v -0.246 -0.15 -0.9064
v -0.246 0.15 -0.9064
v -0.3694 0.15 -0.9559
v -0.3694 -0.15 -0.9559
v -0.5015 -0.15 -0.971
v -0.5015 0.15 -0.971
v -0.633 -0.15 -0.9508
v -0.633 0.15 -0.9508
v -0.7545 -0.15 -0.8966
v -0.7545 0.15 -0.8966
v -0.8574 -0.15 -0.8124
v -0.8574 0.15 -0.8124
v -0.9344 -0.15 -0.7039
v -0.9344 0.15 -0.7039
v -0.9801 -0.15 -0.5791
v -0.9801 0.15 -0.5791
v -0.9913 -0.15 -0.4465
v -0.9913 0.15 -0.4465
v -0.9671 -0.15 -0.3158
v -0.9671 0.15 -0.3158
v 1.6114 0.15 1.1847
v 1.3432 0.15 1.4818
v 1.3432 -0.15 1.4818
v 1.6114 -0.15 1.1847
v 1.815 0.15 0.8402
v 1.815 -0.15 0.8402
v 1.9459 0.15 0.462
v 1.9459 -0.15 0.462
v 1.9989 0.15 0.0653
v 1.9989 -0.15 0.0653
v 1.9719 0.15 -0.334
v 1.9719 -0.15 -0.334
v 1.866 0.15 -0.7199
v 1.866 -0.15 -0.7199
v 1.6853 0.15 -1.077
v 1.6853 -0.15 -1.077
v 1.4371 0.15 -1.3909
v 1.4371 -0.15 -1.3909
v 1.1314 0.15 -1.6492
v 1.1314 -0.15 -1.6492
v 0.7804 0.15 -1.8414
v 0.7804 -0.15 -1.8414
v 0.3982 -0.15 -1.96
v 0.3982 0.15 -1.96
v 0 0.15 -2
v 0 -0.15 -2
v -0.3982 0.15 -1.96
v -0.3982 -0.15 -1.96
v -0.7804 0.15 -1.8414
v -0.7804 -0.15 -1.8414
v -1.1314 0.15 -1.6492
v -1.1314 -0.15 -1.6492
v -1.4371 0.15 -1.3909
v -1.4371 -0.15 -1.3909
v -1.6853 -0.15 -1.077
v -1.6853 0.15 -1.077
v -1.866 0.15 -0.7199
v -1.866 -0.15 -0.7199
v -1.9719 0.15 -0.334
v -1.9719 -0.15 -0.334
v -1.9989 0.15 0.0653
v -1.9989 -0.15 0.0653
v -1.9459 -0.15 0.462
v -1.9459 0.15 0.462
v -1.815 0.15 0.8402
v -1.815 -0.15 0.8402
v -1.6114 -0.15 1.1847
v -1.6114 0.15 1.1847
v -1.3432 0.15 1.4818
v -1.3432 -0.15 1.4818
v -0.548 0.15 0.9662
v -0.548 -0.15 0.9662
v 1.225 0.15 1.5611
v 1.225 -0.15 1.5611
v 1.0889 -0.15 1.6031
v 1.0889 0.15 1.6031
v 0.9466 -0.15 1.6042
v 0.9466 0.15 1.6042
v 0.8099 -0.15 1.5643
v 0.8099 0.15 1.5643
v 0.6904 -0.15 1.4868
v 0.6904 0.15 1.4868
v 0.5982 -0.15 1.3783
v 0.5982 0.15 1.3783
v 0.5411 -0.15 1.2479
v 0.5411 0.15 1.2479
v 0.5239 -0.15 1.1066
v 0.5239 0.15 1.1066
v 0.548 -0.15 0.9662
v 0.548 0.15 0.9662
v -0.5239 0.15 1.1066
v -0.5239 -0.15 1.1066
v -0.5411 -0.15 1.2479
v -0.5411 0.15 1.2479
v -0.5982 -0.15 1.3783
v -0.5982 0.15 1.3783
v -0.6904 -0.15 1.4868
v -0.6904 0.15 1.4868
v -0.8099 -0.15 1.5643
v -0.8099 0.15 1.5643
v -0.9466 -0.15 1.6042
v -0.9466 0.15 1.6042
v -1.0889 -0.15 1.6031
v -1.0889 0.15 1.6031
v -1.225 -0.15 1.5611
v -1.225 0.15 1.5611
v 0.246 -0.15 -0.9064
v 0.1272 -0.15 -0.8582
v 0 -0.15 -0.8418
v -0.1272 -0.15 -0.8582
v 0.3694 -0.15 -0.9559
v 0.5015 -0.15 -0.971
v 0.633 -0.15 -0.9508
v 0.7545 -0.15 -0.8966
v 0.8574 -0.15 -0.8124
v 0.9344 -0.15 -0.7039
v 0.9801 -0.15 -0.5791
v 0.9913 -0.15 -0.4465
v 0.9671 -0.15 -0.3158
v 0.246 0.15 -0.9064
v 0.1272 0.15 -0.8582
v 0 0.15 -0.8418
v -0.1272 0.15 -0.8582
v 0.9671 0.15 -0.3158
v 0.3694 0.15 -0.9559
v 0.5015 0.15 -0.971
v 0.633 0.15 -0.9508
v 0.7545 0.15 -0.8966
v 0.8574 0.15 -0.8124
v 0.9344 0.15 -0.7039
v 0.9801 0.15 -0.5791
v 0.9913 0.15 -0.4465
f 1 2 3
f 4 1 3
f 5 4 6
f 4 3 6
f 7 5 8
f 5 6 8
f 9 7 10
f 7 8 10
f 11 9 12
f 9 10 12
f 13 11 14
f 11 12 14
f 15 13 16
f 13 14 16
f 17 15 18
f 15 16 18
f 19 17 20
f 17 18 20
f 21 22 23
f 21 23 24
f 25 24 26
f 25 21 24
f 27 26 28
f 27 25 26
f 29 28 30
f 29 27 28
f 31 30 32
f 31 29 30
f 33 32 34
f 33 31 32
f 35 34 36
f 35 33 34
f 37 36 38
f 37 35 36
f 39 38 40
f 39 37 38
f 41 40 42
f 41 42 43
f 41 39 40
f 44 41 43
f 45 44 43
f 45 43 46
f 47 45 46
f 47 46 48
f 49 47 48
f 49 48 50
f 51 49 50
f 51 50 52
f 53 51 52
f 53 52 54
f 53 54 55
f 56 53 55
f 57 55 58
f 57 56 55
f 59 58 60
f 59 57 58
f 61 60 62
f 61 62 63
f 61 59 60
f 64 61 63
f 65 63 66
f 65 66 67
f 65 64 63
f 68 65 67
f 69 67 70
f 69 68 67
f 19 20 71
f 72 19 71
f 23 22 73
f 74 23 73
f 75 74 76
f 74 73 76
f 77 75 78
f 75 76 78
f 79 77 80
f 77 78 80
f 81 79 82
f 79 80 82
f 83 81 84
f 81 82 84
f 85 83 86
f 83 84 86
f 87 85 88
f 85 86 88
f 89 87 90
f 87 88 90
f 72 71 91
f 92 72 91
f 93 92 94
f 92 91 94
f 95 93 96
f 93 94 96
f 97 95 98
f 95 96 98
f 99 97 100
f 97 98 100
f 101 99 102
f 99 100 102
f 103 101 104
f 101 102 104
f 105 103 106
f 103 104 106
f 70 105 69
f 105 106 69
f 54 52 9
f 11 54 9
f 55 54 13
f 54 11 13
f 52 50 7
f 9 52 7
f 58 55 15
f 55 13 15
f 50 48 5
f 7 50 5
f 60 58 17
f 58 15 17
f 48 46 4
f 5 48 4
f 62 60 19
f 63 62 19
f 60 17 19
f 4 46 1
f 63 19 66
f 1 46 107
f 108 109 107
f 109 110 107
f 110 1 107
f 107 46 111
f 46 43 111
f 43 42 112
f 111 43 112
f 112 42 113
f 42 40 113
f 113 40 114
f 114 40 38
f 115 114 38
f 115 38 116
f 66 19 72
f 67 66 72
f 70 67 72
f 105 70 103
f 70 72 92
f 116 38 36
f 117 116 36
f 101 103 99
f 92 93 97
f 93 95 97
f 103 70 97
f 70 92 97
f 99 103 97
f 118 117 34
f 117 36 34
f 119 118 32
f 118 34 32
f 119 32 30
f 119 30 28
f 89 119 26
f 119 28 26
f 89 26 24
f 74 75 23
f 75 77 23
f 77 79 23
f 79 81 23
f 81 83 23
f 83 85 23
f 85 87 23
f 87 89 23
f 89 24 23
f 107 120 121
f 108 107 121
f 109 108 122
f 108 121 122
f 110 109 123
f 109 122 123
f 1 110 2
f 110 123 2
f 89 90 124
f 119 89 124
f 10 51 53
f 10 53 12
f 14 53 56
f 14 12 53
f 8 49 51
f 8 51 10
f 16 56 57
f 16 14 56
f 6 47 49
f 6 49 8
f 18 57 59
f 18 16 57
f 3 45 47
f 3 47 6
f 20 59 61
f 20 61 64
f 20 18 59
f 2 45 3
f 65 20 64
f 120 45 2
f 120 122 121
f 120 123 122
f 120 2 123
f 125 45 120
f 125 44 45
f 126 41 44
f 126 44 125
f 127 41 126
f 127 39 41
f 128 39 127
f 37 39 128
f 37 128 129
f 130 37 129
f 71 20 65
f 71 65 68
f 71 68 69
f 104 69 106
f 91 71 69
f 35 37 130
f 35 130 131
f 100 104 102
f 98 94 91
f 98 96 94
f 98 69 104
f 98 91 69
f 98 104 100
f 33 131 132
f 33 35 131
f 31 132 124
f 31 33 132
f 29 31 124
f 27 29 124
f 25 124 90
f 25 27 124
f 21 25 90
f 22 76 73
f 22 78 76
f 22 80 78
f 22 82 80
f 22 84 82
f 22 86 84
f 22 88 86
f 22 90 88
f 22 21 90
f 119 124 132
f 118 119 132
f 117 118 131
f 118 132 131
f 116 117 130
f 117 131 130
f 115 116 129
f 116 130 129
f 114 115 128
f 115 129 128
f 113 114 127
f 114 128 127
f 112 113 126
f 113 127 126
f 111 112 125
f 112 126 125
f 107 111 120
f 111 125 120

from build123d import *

# Parameters (mm, degrees)
SKETCH1_R           = 2
BOSS_EXTRUDE1_DEPTH = 0.15
CUT_EXTRUDE1_DEPTH  = 0.3


with BuildPart() as part:
    # Sketch1 → Boss-Extrude1 (new, symmetric)
    with BuildSketch(Plane(origin=(0, 0, 0), x_dir=(1, 0, 0), z_dir=(0, 1, 0))):
        with Locations(Location((0, 0, 0), (0, 0, 270))):
            Circle(SKETCH1_R)
    extrude(amount=BOSS_EXTRUDE1_DEPTH, both=True)

    # Sketch2 → Cut-Extrude1 (cut)
    with BuildSketch(Plane(origin=(0, 0.15, 0), x_dir=(1, 0, 0), z_dir=(0, 1, 0))):
        with BuildLine():
            Line((-0.967148548, 0.315751436), (-0.548029651, -0.966248909))
            ThreePointArc((-0.548029651, -0.966248909), (-0.747308894, -1.529930389), (-1.34323828, -1.481793145))
            ThreePointArc((-1.34323828, -1.481793145), (0, -2), (1.34323828, -1.481793145))
            ThreePointArc((1.34323828, -1.481793145), (0.747308894, -1.529930389), (0.548029651, -0.966248909))
            Line((0.548029651, -0.966248909), (0.967148548, 0.315751436))
            ThreePointArc((0.967148548, 0.315751436), (0.808720922, 0.8579363), (0.245950629, 0.9064475))
            ThreePointArc((0.245950629, 0.9064475), (0, 0.841772997), (-0.245950629, 0.9064475))
            ThreePointArc((-0.245950629, 0.9064475), (-0.808720922, 0.8579363), (-0.967148548, 0.315751436))
        make_face()
    extrude(amount=-CUT_EXTRUDE1_DEPTH, mode=Mode.SUBTRACT)


solid = part.part
